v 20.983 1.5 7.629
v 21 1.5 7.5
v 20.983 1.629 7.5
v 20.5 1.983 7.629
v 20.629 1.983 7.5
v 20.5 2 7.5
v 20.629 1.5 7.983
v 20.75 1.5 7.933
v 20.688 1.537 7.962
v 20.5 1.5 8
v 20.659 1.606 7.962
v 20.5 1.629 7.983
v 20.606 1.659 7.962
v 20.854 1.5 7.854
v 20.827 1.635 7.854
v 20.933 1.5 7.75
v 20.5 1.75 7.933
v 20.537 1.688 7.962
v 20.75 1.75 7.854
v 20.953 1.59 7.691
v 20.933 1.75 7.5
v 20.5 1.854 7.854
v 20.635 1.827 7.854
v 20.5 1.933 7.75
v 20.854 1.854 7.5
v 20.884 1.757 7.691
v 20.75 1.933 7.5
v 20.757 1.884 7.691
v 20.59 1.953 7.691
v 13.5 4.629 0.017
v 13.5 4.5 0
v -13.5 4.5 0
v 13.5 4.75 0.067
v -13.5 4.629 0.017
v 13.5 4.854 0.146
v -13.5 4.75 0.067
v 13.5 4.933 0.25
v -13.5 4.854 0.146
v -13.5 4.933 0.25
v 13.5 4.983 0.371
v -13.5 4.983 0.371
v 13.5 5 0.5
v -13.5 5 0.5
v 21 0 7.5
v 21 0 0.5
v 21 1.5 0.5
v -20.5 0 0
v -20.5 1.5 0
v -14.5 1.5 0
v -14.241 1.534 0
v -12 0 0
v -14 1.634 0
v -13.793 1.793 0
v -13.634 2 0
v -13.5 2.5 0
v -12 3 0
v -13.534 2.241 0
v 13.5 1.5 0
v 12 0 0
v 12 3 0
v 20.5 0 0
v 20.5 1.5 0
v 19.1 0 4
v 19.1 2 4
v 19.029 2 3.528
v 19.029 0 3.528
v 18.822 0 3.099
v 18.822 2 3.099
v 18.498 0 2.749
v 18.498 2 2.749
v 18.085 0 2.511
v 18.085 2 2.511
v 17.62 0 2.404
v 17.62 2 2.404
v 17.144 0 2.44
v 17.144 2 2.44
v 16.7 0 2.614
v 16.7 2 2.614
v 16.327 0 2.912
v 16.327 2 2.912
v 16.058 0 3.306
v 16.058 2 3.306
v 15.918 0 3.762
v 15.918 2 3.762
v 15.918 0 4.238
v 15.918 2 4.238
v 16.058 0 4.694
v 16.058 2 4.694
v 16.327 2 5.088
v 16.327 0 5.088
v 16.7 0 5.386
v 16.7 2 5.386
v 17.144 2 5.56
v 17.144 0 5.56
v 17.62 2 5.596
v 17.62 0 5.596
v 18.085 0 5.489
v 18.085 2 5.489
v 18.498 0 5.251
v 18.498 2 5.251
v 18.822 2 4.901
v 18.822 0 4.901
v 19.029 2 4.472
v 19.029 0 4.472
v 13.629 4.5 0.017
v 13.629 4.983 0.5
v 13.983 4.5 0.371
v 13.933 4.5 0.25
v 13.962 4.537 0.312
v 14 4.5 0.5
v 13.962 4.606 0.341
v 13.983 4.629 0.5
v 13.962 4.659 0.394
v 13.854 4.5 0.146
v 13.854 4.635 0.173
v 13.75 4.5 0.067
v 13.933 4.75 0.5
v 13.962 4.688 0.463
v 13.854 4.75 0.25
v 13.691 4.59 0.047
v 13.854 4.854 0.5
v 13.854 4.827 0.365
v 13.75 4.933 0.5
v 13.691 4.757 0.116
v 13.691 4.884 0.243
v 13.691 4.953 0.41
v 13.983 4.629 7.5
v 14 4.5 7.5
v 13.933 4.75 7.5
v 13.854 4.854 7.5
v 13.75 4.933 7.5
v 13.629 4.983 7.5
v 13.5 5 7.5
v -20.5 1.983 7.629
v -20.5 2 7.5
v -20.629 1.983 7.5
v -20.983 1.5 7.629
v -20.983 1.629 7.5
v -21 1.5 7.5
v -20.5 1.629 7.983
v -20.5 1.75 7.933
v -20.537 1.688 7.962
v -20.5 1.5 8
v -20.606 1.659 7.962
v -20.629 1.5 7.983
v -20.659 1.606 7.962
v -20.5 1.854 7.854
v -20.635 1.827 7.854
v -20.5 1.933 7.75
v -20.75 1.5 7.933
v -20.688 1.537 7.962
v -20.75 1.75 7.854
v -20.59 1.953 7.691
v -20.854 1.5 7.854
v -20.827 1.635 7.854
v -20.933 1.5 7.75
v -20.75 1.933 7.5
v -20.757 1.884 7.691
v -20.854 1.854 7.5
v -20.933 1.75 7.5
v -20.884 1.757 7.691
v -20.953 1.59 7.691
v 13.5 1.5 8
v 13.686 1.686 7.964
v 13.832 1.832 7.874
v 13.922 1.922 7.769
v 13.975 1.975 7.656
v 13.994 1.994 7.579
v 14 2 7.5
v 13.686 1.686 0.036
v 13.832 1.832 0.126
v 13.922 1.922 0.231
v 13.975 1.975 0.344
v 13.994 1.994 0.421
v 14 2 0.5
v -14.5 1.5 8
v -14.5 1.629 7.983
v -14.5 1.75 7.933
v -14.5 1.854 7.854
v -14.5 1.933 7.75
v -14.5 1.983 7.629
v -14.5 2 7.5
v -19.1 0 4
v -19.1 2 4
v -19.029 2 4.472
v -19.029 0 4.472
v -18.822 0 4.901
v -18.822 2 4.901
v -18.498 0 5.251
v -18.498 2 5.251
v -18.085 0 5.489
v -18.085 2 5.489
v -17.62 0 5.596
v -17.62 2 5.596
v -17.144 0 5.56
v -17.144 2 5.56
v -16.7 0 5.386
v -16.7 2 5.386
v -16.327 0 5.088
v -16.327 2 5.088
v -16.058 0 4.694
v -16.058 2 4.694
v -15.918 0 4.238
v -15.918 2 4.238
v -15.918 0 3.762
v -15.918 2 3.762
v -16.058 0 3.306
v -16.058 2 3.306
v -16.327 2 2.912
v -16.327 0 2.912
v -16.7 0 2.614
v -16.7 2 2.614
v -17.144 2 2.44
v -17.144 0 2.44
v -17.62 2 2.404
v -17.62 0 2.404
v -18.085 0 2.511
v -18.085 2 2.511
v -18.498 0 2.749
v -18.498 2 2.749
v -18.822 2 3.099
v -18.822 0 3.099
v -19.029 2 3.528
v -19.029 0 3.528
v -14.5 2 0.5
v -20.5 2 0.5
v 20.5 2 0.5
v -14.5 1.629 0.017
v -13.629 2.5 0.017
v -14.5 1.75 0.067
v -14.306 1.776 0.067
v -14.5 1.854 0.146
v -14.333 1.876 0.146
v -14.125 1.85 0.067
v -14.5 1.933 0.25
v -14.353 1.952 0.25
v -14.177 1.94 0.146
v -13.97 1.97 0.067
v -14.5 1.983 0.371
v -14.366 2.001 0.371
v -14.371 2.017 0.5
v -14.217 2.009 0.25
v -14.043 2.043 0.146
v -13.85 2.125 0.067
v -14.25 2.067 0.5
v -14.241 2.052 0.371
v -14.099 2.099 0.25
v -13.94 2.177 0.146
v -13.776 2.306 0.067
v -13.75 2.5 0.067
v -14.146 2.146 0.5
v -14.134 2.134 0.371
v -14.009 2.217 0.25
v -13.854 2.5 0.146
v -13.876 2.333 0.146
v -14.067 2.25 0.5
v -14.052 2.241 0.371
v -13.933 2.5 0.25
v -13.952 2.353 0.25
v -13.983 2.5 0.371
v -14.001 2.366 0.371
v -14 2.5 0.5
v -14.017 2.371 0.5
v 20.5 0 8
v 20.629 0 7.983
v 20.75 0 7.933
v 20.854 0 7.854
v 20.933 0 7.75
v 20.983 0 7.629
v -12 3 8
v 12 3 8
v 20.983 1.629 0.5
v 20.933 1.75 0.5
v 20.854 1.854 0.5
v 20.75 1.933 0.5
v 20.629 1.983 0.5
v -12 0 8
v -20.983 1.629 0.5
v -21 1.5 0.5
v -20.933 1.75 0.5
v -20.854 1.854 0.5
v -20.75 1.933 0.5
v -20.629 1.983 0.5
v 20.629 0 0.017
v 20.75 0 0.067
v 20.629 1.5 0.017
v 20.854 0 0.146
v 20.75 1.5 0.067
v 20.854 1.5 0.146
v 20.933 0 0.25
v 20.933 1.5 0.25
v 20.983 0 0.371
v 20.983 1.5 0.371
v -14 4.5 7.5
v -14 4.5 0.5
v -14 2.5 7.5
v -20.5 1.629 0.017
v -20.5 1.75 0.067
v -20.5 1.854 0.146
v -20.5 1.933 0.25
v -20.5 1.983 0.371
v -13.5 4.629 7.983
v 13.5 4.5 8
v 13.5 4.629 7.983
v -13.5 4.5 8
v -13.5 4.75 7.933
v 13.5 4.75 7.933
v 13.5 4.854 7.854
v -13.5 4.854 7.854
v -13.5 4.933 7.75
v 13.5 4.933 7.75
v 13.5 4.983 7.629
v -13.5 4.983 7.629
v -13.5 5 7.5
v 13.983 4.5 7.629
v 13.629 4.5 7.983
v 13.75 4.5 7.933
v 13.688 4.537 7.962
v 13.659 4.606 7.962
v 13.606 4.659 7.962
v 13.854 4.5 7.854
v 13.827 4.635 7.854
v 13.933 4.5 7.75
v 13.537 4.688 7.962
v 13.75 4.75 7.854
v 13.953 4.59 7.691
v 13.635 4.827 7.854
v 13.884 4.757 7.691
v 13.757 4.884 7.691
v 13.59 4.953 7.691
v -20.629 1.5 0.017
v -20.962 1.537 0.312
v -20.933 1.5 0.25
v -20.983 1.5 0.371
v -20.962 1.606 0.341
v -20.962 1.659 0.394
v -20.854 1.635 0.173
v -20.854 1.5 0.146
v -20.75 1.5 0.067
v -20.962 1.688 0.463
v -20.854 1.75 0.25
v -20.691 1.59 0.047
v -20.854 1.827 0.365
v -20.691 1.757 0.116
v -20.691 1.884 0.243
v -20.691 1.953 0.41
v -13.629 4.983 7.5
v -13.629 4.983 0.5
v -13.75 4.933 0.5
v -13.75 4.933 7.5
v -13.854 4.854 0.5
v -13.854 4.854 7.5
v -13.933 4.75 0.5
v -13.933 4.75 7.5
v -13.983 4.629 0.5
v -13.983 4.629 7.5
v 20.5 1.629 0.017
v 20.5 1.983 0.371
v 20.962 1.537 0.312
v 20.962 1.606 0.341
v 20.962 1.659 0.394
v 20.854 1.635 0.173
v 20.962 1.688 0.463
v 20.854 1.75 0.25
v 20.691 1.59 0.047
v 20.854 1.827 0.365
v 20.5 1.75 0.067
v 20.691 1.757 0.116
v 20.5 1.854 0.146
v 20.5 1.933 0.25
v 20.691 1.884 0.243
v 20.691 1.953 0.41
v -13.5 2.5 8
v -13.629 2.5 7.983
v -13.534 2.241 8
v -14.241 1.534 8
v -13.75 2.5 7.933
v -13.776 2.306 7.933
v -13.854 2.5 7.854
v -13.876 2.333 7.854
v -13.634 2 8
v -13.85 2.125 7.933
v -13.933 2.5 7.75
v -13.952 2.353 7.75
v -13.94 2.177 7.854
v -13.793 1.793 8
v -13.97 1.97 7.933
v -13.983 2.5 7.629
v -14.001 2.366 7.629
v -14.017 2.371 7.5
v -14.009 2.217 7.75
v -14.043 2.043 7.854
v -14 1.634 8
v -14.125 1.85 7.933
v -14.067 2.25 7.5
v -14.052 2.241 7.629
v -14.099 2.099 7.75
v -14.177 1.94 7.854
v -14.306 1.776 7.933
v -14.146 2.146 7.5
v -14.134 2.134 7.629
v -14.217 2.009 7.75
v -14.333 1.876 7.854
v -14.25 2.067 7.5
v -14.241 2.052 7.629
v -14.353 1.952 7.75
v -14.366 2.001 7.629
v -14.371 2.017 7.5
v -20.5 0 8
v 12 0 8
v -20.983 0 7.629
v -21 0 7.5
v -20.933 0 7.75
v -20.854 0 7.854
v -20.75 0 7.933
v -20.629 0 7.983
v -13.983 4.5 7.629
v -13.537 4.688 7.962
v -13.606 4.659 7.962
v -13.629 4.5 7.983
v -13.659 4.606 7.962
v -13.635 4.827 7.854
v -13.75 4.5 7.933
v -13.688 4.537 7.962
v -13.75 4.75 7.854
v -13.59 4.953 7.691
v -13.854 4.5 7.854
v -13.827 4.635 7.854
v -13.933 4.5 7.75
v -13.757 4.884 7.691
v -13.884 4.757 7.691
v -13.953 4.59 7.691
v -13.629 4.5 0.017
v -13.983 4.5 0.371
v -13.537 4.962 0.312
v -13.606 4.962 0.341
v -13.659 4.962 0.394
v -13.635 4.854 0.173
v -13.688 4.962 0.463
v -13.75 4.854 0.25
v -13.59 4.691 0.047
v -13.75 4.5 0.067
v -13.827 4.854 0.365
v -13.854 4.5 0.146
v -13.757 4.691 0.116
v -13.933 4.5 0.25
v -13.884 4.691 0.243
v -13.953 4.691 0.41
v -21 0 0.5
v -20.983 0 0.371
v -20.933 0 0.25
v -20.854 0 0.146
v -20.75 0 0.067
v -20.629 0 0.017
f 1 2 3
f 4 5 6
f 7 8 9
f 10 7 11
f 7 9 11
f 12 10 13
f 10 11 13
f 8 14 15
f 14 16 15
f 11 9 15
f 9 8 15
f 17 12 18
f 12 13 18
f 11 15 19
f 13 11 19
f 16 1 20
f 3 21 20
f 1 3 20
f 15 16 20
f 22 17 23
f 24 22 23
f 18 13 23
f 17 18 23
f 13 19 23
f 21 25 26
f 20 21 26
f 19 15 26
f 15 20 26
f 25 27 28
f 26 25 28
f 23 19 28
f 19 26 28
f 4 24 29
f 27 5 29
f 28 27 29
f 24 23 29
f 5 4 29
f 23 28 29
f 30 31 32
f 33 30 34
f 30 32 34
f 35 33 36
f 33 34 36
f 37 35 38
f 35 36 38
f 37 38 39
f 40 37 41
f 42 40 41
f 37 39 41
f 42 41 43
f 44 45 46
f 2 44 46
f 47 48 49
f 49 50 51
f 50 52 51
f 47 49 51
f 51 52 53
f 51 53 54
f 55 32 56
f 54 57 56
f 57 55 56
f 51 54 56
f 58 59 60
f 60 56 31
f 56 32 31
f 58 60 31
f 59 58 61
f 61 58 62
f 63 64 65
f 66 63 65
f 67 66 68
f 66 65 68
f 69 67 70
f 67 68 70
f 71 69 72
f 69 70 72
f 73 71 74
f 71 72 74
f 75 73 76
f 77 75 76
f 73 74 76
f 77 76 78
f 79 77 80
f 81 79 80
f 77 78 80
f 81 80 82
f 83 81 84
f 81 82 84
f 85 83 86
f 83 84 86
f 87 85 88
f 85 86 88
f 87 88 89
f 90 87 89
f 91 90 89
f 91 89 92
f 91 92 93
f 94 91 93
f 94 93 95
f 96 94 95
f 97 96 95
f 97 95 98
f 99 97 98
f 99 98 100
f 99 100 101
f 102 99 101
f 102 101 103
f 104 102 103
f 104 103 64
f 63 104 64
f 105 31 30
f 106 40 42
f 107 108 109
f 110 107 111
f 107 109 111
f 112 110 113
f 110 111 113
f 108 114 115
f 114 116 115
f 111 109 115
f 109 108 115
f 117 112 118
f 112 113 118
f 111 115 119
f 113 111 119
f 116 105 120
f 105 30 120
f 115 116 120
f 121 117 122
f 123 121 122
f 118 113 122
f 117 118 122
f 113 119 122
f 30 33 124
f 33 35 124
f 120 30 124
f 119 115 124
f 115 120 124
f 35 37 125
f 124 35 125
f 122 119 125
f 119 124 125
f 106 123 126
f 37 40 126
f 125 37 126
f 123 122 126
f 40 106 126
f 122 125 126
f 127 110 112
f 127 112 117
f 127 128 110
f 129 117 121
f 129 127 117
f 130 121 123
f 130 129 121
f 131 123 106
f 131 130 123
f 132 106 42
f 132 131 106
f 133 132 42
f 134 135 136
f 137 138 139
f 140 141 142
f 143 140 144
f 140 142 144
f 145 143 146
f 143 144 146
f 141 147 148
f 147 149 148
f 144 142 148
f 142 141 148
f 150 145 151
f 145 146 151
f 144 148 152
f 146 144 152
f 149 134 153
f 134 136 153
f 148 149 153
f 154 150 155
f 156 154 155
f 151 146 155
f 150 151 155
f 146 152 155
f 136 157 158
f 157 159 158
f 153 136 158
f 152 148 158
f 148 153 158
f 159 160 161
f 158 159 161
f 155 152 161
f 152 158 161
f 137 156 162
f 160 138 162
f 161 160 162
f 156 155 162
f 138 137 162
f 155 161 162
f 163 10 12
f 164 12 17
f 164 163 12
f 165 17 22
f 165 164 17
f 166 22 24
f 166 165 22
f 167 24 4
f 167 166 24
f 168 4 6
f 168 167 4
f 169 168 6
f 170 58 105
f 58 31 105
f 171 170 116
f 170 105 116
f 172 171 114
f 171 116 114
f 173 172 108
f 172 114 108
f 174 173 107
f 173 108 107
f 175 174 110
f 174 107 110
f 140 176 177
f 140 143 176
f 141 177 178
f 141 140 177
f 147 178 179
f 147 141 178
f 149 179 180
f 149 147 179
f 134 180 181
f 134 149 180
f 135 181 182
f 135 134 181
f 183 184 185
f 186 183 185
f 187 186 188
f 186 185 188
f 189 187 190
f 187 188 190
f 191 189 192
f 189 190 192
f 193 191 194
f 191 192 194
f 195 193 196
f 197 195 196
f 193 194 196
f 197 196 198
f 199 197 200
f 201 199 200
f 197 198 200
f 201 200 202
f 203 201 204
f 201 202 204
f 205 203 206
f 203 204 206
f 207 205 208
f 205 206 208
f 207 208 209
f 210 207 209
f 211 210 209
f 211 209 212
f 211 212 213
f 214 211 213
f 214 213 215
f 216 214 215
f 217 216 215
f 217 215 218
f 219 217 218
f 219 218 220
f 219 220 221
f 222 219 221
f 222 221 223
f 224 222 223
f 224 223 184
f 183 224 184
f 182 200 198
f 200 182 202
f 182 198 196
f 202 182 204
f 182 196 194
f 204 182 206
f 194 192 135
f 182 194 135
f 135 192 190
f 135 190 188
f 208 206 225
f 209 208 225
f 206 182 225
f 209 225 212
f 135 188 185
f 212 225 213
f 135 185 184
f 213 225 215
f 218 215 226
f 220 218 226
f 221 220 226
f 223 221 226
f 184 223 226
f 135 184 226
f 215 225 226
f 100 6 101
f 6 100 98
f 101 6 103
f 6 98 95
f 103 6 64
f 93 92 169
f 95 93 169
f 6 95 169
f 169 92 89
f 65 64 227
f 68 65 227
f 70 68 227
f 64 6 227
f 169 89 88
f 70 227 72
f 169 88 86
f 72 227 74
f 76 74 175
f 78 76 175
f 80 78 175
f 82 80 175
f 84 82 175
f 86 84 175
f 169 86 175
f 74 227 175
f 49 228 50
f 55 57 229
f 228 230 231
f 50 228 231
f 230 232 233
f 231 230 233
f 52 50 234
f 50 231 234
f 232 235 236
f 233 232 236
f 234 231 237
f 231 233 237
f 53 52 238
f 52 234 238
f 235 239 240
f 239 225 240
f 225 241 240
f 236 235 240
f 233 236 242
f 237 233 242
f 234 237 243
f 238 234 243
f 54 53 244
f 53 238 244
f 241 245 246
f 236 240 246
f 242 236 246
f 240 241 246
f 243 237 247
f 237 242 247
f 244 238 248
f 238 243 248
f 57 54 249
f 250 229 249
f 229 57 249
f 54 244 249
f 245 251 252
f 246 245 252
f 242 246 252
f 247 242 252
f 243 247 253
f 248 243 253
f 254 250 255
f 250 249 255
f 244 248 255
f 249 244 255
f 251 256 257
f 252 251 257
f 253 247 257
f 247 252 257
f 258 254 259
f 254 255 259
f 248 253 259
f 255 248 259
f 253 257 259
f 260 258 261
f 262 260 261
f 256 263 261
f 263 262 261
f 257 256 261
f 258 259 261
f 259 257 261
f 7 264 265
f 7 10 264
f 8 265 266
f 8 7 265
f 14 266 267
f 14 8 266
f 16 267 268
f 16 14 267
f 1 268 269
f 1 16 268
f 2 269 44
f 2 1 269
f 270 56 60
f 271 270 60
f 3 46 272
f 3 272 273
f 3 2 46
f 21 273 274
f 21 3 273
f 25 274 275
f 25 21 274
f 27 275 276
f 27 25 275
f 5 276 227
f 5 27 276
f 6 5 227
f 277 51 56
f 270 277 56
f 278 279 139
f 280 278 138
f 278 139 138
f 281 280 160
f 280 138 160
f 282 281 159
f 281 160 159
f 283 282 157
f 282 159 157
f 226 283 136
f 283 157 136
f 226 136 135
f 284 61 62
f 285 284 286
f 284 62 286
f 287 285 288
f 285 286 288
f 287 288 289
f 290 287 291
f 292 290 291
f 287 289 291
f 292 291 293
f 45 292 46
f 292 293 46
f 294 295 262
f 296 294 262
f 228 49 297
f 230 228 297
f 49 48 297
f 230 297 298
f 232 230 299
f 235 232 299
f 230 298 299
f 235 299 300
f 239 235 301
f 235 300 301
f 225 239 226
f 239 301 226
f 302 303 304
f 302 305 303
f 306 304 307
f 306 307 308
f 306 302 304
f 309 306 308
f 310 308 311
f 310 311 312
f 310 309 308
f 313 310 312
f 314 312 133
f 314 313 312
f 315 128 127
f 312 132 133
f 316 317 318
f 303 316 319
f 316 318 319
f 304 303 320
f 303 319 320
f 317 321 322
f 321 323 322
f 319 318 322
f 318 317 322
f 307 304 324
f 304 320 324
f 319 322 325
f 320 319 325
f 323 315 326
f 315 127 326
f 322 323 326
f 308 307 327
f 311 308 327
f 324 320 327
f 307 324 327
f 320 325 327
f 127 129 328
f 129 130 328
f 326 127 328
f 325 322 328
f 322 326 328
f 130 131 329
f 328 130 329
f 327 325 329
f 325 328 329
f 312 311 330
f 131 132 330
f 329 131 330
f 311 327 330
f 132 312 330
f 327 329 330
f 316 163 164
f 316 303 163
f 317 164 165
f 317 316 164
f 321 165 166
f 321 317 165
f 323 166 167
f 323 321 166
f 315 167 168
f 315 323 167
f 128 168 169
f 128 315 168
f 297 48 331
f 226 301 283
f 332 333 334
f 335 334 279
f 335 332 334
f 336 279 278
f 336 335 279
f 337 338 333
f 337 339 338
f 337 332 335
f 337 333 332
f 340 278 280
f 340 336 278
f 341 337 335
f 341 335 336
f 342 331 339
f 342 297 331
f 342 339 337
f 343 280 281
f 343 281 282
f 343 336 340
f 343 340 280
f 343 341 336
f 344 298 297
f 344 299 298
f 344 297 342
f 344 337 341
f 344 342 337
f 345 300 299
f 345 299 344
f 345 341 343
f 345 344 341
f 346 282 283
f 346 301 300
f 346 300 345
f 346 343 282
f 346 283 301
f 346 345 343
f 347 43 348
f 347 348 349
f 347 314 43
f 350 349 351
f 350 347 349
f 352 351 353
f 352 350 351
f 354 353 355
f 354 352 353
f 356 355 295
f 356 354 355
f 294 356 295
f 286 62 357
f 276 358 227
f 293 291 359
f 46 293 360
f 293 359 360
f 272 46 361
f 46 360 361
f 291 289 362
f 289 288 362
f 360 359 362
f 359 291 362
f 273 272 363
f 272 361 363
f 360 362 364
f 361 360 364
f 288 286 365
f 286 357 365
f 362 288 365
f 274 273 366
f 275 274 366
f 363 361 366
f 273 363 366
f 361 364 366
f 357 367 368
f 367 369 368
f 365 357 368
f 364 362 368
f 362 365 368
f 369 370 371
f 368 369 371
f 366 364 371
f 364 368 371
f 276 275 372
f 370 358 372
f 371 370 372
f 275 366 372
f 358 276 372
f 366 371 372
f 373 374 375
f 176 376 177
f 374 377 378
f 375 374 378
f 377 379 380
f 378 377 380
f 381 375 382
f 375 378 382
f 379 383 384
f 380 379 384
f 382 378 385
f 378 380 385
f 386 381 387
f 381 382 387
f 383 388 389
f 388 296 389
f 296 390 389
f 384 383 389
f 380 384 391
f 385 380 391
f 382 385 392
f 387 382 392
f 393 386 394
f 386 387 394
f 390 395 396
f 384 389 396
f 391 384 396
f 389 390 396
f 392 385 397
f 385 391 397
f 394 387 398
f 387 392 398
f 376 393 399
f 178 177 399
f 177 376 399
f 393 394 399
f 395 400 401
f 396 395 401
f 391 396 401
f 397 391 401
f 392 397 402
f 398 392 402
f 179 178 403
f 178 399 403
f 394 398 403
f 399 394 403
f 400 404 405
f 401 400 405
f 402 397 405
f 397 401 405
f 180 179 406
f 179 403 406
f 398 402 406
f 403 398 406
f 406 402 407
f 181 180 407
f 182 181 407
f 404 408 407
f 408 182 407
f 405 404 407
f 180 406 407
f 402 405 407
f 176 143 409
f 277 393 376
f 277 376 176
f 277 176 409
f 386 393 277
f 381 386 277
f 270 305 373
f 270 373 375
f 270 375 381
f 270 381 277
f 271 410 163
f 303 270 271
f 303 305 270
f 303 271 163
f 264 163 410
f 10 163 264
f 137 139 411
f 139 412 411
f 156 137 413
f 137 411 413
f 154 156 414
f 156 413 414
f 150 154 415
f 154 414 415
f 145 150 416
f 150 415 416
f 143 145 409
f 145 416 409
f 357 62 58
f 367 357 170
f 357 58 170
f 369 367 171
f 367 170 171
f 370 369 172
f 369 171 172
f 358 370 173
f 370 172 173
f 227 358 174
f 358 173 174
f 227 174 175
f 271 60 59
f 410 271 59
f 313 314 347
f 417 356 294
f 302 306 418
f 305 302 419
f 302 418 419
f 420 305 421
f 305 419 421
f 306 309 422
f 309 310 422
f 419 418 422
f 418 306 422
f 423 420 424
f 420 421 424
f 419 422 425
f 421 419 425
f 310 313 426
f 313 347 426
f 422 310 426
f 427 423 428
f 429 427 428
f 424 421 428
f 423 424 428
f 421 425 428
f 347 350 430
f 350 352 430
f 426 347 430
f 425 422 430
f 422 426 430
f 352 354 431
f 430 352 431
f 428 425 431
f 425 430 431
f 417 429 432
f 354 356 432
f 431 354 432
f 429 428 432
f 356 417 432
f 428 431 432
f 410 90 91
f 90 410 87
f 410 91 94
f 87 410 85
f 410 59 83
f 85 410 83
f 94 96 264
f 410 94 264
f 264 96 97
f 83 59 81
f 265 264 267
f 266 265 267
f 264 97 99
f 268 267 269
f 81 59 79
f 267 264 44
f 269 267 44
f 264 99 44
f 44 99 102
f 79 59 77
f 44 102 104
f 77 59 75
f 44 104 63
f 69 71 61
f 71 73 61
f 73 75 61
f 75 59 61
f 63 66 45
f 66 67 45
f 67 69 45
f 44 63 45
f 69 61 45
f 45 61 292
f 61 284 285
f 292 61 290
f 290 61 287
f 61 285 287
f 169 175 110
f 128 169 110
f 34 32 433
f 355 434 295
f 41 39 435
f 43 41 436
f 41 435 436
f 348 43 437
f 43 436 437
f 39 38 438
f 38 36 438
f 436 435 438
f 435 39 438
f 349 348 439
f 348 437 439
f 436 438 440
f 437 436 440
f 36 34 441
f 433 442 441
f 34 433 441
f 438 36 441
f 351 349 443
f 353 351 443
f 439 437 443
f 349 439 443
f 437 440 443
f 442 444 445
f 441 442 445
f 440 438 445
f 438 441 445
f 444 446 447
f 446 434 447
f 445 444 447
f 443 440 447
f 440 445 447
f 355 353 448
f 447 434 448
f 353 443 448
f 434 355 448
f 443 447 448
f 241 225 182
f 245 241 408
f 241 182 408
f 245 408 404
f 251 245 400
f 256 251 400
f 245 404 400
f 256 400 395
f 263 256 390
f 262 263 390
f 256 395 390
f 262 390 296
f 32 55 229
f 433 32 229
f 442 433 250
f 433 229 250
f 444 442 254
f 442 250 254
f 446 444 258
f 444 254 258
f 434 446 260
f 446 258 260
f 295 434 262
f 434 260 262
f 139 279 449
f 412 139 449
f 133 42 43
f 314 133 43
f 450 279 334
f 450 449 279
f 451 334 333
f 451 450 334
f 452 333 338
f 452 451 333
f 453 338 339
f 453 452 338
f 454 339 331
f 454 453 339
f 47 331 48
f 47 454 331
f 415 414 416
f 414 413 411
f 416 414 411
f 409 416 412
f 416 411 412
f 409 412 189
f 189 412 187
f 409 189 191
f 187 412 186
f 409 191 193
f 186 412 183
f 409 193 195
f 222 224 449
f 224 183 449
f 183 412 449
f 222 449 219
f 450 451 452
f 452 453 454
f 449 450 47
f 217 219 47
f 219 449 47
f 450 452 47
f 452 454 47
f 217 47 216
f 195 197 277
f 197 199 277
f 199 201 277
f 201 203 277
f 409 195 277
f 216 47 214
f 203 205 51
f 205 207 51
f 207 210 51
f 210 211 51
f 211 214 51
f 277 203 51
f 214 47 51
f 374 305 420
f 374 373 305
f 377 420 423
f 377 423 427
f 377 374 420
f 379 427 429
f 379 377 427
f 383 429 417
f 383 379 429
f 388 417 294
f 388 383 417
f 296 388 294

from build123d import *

# Parameters (mm, degrees)
GRUNDK_RPER_DEPTH         = 8
SKIZZE2_R                 = 1.6
BOHRUNG_BEFESTIGUNG_DEPTH = 23.671568098
VERRUNDUNG1_R             = 0.5


with BuildPart() as part:
    # Skizze1 → Grundkörper (new body)
    with BuildSketch(Plane.XY):
        Polygon((-21, 0), (-12, 0), (-12, 3), (12, 3), (12, 0), (21, 0), (21, 2), (14, 2), (14, 5), (-14, 5), (-14, 2), (-21, 2), align=None)
    extrude(amount=GRUNDK_RPER_DEPTH)

    # Skizze2 → Bohrung_Befestigung (cut, through all)
    with BuildSketch(Plane(origin=(0, 2, 0), x_dir=(1, 0, 0), z_dir=(0, 1, 0))):
        with Locations(Location((-17.5, -4, 0), (0, 0, 180))):
            Circle(SKIZZE2_R)
        with Locations((17.5, -4)):
            Circle(SKIZZE2_R)
    extrude(amount=-BOHRUNG_BEFESTIGUNG_DEPTH, mode=Mode.SUBTRACT)

    # Verrundung1
    verrundung1_edges = [part.edges().sort_by_distance(p)[0] for p in [
        (-17.5, 2, 0),
        (-14, 3.5, 0),
        (0, 5, 0),
        (14, 3.5, 0),
        (17.5, 2, 0),
        (21, 1, 0),
        (-21, 1, 0),
        (-21, 2, 4),
        (-14, 2, 4),
        (-14, 5, 4),
        (14, 5, 4),
        (21, 2, 4),
        (21, 1, 8),
        (17.5, 2, 8),
        (14, 3.5, 8),
        (0, 5, 8),
        (-14, 3.5, 8),
        (-17.5, 2, 8),
        (-21, 1, 8),
    ]]
    fillet(verrundung1_edges, radius=VERRUNDUNG1_R)


solid = part.part
